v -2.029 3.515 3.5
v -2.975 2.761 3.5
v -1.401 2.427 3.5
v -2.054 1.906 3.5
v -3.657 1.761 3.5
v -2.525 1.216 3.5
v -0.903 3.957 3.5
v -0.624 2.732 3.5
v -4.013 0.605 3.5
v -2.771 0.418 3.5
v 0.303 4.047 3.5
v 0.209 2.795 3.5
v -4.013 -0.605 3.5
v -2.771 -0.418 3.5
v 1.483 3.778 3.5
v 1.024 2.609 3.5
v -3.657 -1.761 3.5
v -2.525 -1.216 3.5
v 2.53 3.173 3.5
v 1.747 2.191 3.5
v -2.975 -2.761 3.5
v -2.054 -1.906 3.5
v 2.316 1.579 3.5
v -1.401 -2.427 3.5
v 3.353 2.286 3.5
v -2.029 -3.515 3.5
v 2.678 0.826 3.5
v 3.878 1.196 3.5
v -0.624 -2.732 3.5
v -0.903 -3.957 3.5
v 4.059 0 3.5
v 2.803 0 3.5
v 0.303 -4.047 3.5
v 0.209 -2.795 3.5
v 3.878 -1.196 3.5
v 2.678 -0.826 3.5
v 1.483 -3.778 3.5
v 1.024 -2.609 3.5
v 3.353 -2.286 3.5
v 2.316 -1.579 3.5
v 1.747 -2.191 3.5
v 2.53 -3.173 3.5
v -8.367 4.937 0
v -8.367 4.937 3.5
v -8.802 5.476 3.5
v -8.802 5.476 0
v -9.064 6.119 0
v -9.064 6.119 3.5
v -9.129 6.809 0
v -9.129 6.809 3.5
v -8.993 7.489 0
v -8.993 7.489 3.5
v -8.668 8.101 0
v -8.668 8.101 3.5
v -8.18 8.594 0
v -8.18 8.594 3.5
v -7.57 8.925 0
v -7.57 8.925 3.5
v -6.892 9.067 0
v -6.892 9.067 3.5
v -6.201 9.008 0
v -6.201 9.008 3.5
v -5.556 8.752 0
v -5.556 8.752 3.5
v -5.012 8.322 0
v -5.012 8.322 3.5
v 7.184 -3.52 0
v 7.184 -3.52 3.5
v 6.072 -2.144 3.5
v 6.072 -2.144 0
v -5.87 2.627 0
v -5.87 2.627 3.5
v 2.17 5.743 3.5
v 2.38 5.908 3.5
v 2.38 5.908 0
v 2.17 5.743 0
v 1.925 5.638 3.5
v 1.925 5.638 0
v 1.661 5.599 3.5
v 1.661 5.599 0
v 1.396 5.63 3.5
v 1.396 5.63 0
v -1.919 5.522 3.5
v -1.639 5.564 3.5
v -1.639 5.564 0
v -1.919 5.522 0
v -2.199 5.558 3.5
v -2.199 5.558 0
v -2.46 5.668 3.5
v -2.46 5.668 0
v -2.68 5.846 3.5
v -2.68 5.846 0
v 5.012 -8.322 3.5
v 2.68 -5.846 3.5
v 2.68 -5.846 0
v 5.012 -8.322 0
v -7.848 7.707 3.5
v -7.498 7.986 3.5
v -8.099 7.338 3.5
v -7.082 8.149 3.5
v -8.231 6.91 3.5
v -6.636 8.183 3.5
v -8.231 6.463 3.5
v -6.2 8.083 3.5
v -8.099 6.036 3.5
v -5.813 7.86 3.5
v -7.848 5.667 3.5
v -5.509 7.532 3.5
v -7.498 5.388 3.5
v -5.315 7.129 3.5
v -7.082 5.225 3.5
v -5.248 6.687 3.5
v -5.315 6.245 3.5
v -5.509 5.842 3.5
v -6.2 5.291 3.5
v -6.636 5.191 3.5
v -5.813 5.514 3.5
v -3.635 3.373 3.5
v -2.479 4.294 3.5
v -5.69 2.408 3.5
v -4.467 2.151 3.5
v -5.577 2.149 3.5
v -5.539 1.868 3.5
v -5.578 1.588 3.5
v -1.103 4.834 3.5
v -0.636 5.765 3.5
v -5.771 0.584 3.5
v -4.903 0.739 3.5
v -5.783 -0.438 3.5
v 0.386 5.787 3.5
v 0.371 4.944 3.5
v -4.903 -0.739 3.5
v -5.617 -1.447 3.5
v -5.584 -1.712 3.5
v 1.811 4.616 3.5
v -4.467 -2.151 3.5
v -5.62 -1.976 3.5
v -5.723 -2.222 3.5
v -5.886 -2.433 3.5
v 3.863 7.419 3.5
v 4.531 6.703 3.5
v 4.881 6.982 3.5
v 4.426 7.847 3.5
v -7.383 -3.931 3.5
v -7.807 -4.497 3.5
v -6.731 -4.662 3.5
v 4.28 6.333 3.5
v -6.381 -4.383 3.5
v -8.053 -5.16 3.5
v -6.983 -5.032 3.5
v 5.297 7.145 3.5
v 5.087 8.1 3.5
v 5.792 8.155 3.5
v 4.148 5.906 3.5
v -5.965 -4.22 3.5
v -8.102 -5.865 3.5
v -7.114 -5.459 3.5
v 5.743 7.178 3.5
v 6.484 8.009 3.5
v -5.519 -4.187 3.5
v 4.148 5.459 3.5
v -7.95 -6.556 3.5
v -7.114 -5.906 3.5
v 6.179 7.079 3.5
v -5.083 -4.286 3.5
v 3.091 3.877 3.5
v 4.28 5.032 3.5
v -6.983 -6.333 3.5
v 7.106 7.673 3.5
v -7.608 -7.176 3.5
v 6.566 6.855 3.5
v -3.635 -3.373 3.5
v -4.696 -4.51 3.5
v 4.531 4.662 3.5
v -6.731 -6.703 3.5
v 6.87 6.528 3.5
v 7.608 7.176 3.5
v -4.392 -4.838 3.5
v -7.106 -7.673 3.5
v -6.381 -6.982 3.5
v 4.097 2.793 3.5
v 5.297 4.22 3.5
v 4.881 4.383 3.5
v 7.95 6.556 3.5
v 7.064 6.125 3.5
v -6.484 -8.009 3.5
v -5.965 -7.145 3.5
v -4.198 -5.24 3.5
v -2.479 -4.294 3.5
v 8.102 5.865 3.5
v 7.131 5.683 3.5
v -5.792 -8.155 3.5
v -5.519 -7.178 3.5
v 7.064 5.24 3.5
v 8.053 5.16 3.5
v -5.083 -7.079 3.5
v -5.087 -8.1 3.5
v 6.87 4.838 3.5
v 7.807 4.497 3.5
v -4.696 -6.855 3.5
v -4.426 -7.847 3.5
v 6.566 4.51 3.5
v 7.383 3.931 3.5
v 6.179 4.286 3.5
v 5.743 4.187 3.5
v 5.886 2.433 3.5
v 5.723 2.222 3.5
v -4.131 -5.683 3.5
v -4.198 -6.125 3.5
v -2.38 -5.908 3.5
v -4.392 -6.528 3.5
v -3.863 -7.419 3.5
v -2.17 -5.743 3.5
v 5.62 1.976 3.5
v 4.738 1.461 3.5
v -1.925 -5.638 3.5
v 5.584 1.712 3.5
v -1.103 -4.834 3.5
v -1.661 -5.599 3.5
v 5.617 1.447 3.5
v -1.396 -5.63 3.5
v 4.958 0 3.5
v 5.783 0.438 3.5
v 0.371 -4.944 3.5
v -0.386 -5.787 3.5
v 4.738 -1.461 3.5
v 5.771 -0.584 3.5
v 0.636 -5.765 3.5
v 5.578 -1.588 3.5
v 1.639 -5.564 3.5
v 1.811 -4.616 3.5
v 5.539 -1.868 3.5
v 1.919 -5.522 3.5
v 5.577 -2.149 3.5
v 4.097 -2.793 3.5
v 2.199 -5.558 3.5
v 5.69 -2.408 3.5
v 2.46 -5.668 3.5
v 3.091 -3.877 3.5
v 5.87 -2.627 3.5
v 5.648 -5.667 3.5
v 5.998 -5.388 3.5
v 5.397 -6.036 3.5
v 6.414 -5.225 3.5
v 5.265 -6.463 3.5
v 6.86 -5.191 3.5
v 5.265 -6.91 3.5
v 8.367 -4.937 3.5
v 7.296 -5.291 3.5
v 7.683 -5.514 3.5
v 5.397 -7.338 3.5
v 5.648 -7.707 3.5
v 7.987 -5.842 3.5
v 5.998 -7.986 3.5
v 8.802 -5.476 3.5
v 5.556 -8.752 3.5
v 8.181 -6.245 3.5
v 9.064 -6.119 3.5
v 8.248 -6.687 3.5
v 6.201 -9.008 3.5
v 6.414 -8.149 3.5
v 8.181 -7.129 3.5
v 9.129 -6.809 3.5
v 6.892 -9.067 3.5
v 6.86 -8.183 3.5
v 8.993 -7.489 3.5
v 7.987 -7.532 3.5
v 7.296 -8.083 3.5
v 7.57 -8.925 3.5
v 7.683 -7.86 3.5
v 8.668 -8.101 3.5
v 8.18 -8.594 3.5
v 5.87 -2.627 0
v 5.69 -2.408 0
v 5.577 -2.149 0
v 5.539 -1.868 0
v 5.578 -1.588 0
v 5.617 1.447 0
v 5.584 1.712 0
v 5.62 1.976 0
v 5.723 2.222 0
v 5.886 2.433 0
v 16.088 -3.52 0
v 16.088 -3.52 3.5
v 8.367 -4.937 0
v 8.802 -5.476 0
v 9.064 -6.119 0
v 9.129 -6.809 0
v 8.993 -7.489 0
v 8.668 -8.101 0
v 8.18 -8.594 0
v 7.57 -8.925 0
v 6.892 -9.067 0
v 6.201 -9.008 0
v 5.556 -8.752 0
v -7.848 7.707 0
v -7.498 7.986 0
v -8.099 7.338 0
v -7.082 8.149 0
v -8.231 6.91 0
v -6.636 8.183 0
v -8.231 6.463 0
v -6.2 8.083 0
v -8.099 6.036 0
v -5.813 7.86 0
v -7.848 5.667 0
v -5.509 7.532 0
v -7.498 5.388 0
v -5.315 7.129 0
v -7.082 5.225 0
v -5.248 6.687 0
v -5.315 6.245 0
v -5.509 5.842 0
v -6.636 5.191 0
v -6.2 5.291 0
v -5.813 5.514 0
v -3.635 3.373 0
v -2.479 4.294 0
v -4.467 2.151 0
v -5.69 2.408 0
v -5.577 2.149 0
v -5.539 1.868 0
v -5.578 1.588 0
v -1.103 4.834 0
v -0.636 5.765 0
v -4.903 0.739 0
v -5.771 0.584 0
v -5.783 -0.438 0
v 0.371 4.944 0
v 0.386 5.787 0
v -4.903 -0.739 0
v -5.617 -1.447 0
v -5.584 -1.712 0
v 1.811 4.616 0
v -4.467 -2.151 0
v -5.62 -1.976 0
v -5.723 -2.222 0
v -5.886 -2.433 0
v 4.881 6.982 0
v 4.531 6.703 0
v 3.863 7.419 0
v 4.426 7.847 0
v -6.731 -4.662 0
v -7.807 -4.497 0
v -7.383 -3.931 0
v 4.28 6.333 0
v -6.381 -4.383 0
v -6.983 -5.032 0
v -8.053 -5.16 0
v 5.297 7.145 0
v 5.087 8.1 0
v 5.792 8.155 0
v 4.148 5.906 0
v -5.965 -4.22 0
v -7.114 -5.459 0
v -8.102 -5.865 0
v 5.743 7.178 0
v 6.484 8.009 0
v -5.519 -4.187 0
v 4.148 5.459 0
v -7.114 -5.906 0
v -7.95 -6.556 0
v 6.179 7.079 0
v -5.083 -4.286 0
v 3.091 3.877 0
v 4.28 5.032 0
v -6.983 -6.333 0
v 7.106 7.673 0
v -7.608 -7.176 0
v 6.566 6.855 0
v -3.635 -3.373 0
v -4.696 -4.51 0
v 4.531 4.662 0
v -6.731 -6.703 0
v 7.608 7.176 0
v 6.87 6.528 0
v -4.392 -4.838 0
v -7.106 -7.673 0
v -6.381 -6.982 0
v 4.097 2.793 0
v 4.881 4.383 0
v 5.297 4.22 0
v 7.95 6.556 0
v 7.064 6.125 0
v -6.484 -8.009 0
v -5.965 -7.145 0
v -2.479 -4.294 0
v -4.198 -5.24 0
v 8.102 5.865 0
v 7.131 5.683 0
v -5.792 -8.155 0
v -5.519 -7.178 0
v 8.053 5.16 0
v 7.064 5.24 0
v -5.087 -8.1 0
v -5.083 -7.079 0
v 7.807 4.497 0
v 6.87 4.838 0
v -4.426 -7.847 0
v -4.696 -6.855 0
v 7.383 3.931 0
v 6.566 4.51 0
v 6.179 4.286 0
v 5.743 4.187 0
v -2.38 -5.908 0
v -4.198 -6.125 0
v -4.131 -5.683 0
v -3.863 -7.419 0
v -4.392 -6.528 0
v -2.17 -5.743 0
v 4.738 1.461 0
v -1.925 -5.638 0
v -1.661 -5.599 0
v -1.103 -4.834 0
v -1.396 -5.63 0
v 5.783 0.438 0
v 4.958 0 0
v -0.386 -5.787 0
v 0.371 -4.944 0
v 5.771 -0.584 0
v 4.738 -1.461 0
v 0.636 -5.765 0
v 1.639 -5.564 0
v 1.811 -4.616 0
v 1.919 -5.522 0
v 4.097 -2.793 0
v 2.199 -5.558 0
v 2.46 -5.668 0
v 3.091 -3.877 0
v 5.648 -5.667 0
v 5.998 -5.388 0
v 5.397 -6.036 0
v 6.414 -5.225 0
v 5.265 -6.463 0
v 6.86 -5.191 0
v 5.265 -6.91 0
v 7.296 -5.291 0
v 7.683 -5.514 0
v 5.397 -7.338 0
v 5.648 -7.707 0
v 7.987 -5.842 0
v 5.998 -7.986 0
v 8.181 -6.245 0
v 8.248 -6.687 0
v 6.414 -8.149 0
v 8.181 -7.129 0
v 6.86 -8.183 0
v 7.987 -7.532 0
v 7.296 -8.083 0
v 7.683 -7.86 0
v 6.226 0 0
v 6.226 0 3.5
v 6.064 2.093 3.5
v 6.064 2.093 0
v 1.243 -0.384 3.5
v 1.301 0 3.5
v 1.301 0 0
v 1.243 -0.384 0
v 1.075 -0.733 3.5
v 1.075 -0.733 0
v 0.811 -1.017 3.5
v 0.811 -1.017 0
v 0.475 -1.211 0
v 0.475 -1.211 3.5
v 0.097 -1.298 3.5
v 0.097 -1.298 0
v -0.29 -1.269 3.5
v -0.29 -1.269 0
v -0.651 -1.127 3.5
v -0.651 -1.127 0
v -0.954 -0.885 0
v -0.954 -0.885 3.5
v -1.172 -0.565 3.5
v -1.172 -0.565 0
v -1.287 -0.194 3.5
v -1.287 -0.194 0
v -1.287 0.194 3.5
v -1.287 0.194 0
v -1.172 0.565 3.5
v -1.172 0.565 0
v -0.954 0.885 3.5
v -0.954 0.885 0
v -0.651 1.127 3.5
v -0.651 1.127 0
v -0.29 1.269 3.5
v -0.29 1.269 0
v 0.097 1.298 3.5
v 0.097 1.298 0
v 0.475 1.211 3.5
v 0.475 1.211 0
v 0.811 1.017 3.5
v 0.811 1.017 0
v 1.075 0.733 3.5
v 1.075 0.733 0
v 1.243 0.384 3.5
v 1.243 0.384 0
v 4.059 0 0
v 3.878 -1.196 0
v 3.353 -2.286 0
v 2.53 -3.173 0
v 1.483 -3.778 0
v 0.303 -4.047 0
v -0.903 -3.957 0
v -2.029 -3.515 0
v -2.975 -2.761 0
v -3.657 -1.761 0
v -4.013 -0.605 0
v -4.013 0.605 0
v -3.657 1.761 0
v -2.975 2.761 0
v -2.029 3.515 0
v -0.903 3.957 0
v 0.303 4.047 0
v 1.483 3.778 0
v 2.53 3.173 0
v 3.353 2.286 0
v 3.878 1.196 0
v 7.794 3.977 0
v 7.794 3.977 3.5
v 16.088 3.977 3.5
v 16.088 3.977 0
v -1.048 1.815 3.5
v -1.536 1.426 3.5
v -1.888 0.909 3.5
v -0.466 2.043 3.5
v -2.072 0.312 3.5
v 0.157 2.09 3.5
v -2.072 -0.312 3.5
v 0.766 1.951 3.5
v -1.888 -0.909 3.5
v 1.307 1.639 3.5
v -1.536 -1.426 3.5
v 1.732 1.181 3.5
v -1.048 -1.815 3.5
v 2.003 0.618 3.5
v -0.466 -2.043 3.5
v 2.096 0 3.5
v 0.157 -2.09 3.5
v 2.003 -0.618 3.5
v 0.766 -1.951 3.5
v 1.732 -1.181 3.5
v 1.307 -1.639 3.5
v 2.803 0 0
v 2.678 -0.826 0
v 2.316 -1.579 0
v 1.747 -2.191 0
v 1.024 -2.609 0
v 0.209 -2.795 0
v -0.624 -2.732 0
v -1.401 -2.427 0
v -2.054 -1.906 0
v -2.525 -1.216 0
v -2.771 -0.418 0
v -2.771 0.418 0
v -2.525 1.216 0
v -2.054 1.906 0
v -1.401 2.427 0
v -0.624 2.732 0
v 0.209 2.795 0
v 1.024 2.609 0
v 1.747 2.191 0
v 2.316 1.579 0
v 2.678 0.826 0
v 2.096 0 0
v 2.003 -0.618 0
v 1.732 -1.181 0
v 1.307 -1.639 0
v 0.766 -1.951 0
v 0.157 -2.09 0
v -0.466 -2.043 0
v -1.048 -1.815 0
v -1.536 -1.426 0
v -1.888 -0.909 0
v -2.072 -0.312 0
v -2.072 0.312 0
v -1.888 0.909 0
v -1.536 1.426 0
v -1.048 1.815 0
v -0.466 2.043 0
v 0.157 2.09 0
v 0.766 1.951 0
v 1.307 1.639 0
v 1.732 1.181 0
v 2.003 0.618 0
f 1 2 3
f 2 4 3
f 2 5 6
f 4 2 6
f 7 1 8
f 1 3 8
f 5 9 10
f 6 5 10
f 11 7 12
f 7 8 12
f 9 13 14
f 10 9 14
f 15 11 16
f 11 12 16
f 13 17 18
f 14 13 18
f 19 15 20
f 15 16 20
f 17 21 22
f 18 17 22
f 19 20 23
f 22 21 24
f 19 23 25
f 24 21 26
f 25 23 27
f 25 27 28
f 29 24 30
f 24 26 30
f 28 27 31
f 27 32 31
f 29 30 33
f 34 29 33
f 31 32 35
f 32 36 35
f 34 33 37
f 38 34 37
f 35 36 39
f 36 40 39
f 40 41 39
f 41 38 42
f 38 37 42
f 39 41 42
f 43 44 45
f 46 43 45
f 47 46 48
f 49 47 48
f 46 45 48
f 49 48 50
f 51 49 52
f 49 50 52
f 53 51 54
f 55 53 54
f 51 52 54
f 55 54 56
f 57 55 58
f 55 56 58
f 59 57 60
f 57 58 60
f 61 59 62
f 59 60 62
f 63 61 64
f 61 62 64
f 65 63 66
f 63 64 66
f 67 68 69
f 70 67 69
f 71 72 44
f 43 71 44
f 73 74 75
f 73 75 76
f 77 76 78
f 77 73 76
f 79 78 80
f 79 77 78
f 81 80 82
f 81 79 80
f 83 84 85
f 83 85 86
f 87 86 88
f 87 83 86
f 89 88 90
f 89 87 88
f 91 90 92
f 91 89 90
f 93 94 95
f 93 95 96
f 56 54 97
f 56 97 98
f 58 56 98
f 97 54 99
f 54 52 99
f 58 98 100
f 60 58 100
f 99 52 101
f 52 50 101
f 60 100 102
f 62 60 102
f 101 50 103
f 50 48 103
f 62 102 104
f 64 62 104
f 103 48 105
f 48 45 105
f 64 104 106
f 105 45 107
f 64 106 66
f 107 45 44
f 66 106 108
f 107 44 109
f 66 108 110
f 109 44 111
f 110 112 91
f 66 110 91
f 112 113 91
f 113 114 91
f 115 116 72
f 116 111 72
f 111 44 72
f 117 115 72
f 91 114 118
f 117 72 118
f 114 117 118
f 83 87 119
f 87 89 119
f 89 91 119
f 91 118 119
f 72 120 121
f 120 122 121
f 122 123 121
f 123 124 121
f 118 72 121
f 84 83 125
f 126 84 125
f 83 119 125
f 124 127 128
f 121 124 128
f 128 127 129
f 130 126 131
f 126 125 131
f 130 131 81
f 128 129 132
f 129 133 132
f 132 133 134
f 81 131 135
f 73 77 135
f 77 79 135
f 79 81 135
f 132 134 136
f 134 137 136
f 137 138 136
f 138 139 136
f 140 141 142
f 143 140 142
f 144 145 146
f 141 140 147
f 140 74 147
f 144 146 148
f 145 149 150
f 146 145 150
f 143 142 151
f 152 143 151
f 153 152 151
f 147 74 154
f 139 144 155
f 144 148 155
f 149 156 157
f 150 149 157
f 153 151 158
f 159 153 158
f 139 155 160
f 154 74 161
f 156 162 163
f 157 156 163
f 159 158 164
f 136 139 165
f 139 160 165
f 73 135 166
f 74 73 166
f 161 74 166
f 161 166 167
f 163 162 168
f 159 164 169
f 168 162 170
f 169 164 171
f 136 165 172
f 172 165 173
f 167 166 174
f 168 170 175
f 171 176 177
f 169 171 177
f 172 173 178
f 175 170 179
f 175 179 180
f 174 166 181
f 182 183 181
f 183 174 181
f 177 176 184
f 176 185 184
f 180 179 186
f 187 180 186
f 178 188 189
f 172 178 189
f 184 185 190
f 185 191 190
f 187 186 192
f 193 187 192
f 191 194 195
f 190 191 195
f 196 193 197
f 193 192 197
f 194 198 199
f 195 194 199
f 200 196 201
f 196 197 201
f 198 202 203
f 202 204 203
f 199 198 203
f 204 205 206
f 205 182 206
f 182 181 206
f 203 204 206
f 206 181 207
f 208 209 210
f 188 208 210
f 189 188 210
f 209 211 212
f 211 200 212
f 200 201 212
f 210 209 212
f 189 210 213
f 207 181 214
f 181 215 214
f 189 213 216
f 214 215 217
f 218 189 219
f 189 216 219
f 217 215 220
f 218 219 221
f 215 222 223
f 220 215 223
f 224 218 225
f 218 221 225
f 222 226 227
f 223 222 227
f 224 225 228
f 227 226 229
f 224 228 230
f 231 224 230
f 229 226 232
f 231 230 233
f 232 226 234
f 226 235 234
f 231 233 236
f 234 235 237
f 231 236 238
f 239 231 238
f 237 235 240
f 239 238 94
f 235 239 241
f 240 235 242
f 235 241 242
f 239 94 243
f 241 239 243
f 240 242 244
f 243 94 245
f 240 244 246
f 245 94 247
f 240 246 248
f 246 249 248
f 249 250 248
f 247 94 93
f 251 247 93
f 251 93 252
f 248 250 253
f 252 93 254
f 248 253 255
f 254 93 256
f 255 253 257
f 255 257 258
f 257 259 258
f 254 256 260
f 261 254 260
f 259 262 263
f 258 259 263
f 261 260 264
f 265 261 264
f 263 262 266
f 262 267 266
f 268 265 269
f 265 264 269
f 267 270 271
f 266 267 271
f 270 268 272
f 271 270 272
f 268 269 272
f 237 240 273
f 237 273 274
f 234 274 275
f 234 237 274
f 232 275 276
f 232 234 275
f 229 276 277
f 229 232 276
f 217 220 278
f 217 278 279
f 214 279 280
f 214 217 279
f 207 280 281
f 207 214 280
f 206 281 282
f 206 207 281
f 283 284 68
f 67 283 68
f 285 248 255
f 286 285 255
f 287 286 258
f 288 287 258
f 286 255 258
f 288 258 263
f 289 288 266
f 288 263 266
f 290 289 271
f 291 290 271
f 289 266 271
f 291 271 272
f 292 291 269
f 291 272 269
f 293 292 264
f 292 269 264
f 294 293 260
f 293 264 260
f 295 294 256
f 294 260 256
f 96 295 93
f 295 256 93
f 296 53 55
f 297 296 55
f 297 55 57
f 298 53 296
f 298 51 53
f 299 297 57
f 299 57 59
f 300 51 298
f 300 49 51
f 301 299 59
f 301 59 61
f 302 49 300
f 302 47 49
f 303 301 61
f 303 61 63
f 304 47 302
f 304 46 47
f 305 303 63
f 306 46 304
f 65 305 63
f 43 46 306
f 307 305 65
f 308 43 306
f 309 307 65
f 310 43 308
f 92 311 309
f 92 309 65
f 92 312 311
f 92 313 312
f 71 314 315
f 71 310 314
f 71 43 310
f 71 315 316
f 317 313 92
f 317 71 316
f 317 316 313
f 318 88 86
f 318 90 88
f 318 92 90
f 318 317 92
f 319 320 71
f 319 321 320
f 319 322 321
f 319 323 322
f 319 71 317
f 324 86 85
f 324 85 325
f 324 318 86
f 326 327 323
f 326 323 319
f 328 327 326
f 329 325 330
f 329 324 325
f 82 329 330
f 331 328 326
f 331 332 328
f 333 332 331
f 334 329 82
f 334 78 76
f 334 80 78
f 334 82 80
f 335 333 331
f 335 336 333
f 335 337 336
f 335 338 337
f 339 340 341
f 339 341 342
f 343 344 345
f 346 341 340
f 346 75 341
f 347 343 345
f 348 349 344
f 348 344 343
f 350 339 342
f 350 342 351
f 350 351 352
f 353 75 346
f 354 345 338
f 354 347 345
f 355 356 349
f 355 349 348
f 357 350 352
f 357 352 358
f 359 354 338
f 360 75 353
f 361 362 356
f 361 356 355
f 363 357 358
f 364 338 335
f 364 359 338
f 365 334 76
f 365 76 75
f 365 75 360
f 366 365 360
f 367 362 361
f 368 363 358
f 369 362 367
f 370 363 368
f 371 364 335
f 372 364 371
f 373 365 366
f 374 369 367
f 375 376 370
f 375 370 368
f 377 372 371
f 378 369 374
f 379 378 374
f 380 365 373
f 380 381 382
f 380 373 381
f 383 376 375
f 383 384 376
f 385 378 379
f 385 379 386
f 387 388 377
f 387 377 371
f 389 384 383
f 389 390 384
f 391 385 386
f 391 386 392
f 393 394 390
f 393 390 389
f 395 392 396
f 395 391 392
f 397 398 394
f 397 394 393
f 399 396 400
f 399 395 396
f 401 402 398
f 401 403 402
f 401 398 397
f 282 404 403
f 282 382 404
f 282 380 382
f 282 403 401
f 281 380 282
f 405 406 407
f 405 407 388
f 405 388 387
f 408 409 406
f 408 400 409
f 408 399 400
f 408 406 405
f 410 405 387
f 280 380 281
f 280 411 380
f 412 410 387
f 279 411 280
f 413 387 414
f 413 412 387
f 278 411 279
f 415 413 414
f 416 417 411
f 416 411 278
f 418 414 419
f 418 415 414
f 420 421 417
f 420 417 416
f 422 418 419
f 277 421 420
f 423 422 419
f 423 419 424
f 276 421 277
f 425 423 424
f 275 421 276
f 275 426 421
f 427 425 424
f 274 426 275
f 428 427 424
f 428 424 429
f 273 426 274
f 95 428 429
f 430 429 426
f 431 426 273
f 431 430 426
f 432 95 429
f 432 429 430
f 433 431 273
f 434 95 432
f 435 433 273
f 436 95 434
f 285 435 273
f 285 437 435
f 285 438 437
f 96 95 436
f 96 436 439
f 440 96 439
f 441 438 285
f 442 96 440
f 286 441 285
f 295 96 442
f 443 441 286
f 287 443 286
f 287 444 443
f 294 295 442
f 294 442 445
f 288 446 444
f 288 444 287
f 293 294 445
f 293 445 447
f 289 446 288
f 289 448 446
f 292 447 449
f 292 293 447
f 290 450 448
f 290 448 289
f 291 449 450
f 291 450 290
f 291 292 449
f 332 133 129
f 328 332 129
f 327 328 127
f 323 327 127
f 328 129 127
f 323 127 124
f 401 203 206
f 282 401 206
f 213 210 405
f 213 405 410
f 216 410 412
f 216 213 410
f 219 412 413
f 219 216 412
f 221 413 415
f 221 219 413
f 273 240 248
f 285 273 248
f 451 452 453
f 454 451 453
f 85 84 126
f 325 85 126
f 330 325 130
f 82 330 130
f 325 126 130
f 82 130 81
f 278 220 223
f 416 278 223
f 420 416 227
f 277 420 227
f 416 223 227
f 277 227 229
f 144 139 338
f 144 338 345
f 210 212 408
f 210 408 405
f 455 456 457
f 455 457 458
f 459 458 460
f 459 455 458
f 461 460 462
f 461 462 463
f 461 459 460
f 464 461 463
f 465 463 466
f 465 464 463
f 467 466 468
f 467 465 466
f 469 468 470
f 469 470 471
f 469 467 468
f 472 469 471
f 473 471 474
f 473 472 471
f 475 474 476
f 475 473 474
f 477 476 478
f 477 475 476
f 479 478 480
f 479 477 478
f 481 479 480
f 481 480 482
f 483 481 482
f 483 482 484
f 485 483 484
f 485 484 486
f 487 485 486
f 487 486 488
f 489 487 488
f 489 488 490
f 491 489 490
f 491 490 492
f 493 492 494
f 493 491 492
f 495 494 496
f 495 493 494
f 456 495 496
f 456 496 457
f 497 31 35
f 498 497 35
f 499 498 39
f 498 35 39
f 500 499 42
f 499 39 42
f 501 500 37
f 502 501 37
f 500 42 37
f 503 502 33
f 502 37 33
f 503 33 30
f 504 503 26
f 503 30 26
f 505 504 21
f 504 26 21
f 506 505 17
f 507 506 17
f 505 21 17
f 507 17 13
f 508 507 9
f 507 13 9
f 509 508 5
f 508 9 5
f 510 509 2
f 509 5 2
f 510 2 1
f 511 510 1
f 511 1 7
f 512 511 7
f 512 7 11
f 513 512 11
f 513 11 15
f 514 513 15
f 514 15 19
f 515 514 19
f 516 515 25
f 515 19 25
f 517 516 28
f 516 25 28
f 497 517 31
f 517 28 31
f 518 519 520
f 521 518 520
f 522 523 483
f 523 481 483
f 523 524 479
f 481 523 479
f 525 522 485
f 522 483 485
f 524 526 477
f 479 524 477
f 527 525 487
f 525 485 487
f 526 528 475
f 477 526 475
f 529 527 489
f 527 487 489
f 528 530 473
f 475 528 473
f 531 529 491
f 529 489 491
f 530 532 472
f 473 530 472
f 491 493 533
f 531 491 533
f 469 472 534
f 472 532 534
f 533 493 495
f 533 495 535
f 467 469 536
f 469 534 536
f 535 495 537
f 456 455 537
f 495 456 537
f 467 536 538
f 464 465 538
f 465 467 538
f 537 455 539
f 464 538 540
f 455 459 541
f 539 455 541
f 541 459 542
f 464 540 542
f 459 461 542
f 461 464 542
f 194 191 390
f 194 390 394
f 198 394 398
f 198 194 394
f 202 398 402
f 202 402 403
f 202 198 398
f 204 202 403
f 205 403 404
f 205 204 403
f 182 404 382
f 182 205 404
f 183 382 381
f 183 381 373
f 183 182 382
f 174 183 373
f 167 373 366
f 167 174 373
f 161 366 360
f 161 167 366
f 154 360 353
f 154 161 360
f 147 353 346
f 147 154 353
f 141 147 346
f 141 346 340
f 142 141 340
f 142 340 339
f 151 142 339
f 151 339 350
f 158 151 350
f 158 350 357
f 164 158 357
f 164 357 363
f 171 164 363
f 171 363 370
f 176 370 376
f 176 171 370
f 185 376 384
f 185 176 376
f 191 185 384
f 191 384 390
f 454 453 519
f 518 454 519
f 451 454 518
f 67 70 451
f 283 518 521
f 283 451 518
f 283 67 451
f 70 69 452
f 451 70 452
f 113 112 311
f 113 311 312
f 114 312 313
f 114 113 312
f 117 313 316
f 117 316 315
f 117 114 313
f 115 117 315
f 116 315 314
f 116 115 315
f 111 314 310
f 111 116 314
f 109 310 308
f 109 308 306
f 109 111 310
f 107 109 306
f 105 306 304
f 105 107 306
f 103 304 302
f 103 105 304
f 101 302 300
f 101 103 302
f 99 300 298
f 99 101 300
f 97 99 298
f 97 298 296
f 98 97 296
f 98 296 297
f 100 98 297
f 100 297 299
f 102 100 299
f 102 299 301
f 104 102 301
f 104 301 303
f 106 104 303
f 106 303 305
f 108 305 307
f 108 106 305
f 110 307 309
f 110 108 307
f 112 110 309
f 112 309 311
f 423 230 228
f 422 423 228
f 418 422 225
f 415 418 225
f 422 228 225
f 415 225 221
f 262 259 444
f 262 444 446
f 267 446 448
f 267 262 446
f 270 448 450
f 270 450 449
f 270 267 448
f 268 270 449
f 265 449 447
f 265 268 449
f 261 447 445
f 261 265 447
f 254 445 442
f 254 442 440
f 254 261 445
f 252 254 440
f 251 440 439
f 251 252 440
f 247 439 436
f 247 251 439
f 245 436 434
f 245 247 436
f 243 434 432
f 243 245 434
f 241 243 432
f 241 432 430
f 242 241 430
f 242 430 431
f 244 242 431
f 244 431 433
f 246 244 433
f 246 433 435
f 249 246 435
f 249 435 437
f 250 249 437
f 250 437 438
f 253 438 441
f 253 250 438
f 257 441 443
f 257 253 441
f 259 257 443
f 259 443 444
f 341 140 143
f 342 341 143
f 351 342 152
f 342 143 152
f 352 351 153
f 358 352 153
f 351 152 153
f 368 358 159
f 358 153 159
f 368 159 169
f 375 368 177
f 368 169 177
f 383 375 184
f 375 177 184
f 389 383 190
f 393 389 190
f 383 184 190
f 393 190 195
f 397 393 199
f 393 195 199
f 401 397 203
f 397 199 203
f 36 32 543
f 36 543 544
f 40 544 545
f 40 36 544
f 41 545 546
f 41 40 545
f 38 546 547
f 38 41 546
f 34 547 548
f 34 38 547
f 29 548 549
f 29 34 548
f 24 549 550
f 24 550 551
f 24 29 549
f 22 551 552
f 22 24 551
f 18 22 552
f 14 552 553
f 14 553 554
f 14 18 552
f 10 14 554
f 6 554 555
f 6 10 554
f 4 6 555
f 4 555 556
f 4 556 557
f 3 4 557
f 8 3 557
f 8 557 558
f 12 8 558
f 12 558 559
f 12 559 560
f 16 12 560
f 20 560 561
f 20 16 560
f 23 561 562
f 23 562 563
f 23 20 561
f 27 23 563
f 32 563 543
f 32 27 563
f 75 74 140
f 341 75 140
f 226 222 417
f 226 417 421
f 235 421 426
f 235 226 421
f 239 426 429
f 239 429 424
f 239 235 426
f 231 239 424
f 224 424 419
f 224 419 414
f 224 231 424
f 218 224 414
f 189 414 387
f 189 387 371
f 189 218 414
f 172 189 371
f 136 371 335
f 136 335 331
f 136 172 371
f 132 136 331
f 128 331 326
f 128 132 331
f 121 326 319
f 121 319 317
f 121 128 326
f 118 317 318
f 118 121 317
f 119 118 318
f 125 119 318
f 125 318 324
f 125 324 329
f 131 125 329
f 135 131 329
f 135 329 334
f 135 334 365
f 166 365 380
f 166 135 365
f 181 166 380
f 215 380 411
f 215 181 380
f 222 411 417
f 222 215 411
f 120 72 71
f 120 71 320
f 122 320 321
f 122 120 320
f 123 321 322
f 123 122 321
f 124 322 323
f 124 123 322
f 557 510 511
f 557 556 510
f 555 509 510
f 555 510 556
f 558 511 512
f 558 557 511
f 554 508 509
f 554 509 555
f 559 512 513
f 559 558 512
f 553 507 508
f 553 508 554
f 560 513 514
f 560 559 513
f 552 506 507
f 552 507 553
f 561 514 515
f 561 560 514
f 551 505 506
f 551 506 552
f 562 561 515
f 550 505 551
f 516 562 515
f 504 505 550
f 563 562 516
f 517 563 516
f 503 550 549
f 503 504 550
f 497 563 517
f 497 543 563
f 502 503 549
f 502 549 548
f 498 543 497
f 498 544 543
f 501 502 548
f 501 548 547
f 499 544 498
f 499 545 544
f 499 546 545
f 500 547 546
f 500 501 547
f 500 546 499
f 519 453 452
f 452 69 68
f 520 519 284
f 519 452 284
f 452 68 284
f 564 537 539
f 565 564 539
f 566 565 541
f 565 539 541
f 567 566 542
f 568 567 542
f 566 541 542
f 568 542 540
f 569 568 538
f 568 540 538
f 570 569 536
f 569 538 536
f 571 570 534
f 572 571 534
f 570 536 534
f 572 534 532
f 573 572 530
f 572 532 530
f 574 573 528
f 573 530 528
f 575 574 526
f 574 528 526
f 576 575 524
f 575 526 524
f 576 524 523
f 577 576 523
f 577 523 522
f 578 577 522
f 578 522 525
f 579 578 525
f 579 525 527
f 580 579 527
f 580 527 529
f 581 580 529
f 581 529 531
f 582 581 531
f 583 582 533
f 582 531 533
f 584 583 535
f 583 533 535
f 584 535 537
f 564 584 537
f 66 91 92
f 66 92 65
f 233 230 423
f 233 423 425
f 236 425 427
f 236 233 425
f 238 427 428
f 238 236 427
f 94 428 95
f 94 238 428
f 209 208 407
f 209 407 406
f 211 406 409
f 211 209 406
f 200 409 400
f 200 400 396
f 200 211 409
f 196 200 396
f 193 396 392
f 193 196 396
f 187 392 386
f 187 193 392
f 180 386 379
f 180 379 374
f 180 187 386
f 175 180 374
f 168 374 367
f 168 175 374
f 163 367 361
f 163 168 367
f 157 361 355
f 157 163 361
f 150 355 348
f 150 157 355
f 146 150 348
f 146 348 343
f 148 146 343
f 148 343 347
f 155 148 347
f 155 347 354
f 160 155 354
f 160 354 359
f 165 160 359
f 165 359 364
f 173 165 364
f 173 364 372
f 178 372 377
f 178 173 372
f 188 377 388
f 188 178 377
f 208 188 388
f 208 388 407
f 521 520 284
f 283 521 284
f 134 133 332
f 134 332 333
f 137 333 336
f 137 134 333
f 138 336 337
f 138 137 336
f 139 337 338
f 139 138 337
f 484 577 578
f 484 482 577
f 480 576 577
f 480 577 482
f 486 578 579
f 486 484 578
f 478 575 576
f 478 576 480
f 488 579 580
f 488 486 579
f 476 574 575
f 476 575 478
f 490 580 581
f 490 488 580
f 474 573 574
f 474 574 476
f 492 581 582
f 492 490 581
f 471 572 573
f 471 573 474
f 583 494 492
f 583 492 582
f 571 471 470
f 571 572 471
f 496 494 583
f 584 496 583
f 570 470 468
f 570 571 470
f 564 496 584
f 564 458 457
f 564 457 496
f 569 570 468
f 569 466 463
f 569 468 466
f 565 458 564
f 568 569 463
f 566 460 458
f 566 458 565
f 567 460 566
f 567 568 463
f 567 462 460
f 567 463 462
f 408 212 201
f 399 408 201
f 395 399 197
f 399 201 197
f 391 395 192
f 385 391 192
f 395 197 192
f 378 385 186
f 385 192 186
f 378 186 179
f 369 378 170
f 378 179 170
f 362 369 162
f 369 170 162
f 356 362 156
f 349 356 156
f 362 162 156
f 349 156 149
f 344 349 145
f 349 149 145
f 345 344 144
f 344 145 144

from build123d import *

# Parameters (mm, degrees)
SKETCH001_R             = 4.958328
SKETCH001_R_2           = 1.5
SKETCH001_R_3           = 4.05855
SKETCH001_R_4           = 2.802528
SKETCH001_R_5           = 2.095874
SKETCH001_R_6           = 1.301286
EXTRUDE_DEPTH           = 3.5
EXTRUDE_PLACEMENT_ANGLE = 180


with BuildPart() as part:
    # Sketch001 → Extrude (new body)
    with BuildSketch(Plane.XY):
        with BuildLine():
            ThreePointArc((8.366924, 4.936506), (8.441586, 8.36515), (5.012404, 8.321677))
            Line((2.680297, 5.845762), (5.012404, 8.321677))
            ThreePointArc((1.638648, 5.563707), (2.199329, 5.557542), (2.680297, 5.845762))
            ThreePointArc((1.638648, 5.563707), (0.125732, 5.798637), (-1.395946, 5.629506))
            ThreePointArc((-2.379545, 5.90775), (-1.924662, 5.638128), (-1.395946, 5.629506))
            Line((-3.863349, 7.418599), (-2.379545, 5.90775))
            ThreePointArc((-3.863349, 7.418599), (-7.375053, 7.442442), (-7.383153, 3.930667))
            Line((-5.885862, 2.433181), (-7.383153, 3.930667))
            ThreePointArc((-5.616576, 1.447093), (-5.620389, 1.975865), (-5.885862, 2.433181))
            ThreePointArc((-5.616576, 1.447093), (-5.799541, -0.072984), (-5.578381, -1.587975))
            ThreePointArc((-5.869899, -2.627015), (-5.577316, -2.148689), (-5.578381, -1.587975))
            Line((-5.869899, -2.627015), (-8.366924, -4.936506))
            ThreePointArc((-8.366924, -4.936506), (-8.441586, -8.36515), (-5.012404, -8.321677))
            Line((-2.680297, -5.845762), (-5.012404, -8.321677))
            ThreePointArc((-1.638648, -5.563707), (-2.199329, -5.557542), (-2.680297, -5.845762))
            ThreePointArc((-1.638648, -5.563707), (-0.125732, -5.798637), (1.395946, -5.629506))
            ThreePointArc((2.379545, -5.90775), (1.924662, -5.638128), (1.395946, -5.629506))
            Line((2.379545, -5.90775), (3.863349, -7.418599))
            ThreePointArc((3.863349, -7.418599), (7.375053, -7.442442), (7.383153, -3.930667))
            Line((7.383153, -3.930667), (5.885862, -2.433181))
            ThreePointArc((5.616576, -1.447093), (5.620389, -1.975865), (5.885862, -2.433181))
            ThreePointArc((5.616576, -1.447093), (5.799541, 0.072984), (5.578381, 1.587975))
            ThreePointArc((5.869899, 2.627015), (5.577316, 2.148689), (5.578381, 1.587975))
            Line((5.869899, 2.627015), (8.366924, 4.936506))
        make_face()
        Circle(SKETCH001_R, mode=Mode.SUBTRACT)
        with Locations((6.747995, 6.686895)):
            Circle(SKETCH001_R_2, mode=Mode.SUBTRACT)
        with Locations((-5.631069, 5.682522)):
            Circle(SKETCH001_R_2, mode=Mode.SUBTRACT)
        with Locations((-6.747995, -6.686895)):
            Circle(SKETCH001_R_2, mode=Mode.SUBTRACT)
        with Locations((5.631069, -5.682522)):
            Circle(SKETCH001_R_2, mode=Mode.SUBTRACT)
        Polygon((16.088053, -3.976689), (16.088053, 3.52014), (7.183914, 3.52014), (6.072395, 2.14391), (6.225872, 0), (6.064379, -2.093428), (7.794163, -3.976689), align=None)
        Circle(SKETCH001_R_3)
        Circle(SKETCH001_R_4, mode=Mode.SUBTRACT)
        Circle(SKETCH001_R_5)
        Circle(SKETCH001_R_6, mode=Mode.SUBTRACT)
    extrude(amount=EXTRUDE_DEPTH)


with BuildPart() as part_1:
    # Extrude placement: moved
    add(part.part.moved(Location((0, 0, 3.5))).rotate(Axis((0, 0, 3.5), (1, 0, 0)), EXTRUDE_PLACEMENT_ANGLE))


solid = part_1.part
